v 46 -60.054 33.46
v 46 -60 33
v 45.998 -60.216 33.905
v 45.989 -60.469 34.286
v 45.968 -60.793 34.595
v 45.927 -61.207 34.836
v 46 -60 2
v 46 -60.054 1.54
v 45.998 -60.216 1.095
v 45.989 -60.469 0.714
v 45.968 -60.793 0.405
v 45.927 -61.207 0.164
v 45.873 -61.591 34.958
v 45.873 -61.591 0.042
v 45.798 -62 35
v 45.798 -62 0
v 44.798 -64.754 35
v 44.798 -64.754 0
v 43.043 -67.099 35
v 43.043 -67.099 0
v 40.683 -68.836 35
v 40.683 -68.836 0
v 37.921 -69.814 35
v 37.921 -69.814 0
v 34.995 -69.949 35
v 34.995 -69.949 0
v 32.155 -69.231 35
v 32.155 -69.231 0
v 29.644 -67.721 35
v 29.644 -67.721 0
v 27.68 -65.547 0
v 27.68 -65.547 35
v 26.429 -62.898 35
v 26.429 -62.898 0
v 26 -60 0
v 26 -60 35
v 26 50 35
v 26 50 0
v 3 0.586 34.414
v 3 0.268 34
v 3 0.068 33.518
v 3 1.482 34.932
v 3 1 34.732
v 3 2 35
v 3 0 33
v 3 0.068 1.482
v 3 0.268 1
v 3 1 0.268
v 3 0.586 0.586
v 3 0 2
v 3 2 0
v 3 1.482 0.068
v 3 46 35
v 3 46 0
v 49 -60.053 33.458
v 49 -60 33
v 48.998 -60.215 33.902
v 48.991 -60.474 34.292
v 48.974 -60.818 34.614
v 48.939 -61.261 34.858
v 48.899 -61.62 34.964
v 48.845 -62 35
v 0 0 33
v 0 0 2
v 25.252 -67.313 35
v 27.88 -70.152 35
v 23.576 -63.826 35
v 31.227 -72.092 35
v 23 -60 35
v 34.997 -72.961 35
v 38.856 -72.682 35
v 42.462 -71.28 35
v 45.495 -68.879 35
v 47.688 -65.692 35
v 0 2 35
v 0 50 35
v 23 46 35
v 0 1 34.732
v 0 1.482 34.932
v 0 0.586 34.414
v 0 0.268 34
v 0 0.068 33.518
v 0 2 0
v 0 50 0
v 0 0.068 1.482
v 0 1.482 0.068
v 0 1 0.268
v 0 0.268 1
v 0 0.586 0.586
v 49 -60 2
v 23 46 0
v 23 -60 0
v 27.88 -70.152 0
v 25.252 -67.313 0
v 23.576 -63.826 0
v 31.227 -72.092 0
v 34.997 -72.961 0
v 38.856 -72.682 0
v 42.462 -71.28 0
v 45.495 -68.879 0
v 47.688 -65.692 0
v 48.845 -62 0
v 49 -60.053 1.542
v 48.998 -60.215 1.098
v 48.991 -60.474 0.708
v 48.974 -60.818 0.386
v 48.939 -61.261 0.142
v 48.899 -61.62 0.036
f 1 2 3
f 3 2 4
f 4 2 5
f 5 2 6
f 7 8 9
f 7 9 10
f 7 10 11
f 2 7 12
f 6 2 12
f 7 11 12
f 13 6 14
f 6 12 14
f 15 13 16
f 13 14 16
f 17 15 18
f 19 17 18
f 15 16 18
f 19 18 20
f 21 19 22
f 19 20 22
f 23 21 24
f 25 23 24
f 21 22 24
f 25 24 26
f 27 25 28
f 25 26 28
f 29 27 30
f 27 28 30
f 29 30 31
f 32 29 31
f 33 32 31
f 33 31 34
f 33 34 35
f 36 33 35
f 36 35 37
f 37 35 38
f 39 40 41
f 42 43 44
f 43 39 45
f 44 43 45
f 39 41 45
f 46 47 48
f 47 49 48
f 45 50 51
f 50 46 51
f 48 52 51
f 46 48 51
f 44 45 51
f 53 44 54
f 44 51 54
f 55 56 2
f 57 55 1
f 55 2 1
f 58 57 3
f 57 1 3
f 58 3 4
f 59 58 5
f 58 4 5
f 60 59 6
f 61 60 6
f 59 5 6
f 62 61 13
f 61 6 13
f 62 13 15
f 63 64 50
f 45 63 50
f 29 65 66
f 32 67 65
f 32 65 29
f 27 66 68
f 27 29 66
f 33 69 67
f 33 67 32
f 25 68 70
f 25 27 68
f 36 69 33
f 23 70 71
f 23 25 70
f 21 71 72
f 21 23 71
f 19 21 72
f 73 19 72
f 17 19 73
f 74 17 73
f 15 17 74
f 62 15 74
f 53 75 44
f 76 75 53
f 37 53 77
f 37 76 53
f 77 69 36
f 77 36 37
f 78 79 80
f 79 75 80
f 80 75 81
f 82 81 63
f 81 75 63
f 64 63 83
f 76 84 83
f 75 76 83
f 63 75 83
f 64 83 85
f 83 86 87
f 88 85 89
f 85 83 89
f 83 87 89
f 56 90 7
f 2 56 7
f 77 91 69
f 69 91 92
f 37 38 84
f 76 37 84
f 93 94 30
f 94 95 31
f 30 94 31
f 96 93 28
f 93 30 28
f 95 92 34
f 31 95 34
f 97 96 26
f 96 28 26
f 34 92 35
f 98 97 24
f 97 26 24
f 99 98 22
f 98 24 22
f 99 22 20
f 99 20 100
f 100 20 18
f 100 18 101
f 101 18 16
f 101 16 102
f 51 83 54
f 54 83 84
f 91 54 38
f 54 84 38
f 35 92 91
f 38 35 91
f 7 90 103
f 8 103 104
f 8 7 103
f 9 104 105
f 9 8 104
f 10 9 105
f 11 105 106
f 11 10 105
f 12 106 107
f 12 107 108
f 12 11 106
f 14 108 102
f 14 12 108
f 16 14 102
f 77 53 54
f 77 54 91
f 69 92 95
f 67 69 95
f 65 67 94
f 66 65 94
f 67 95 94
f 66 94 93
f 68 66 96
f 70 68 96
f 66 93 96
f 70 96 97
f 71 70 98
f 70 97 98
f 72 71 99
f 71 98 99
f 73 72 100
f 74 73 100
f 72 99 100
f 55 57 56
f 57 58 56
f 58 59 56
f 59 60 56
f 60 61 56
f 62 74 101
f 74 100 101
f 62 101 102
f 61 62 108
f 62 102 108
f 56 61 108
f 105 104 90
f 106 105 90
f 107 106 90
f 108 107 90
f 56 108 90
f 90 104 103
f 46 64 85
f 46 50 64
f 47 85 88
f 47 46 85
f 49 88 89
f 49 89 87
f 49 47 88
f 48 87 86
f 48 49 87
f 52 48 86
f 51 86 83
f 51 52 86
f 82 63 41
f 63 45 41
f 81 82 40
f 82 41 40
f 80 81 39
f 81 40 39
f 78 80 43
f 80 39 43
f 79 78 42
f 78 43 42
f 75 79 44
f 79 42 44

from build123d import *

# Parameters (mm, degrees)
F1_DEPTH = 35
F2_R     = 2


with BuildPart() as f1:
    # F0 (on Top) → F1 (new body)
    with BuildSketch(Plane.XY):
        with BuildLine():
            Line((0, 50), (0, 0))
            Line((0, 0), (3, 0))
            Line((3, 0), (3, 46))
            Line((3, 46), (23, 46))
            Line((23, 46), (23, -60))
            ThreePointArc((23, -60), (36, -73), (49, -60))
            Line((49, -60), (46, -60))
            ThreePointArc((46, -60), (36, -70), (26, -60))
            Line((26, -60), (26, 50))
            Line((26, 50), (0, 50))
        make_face()
    extrude(amount=F1_DEPTH)

    # F2
    f2_edges = [f1.edges().sort_by_distance(p)[0] for p in [
        (47.5, -60, 35),
        (47.5, -60, 0),
        (1.5, 0, 35),
        (1.5, 0, 0),
    ]]
    fillet(f2_edges, radius=F2_R)


solid = f1.part
